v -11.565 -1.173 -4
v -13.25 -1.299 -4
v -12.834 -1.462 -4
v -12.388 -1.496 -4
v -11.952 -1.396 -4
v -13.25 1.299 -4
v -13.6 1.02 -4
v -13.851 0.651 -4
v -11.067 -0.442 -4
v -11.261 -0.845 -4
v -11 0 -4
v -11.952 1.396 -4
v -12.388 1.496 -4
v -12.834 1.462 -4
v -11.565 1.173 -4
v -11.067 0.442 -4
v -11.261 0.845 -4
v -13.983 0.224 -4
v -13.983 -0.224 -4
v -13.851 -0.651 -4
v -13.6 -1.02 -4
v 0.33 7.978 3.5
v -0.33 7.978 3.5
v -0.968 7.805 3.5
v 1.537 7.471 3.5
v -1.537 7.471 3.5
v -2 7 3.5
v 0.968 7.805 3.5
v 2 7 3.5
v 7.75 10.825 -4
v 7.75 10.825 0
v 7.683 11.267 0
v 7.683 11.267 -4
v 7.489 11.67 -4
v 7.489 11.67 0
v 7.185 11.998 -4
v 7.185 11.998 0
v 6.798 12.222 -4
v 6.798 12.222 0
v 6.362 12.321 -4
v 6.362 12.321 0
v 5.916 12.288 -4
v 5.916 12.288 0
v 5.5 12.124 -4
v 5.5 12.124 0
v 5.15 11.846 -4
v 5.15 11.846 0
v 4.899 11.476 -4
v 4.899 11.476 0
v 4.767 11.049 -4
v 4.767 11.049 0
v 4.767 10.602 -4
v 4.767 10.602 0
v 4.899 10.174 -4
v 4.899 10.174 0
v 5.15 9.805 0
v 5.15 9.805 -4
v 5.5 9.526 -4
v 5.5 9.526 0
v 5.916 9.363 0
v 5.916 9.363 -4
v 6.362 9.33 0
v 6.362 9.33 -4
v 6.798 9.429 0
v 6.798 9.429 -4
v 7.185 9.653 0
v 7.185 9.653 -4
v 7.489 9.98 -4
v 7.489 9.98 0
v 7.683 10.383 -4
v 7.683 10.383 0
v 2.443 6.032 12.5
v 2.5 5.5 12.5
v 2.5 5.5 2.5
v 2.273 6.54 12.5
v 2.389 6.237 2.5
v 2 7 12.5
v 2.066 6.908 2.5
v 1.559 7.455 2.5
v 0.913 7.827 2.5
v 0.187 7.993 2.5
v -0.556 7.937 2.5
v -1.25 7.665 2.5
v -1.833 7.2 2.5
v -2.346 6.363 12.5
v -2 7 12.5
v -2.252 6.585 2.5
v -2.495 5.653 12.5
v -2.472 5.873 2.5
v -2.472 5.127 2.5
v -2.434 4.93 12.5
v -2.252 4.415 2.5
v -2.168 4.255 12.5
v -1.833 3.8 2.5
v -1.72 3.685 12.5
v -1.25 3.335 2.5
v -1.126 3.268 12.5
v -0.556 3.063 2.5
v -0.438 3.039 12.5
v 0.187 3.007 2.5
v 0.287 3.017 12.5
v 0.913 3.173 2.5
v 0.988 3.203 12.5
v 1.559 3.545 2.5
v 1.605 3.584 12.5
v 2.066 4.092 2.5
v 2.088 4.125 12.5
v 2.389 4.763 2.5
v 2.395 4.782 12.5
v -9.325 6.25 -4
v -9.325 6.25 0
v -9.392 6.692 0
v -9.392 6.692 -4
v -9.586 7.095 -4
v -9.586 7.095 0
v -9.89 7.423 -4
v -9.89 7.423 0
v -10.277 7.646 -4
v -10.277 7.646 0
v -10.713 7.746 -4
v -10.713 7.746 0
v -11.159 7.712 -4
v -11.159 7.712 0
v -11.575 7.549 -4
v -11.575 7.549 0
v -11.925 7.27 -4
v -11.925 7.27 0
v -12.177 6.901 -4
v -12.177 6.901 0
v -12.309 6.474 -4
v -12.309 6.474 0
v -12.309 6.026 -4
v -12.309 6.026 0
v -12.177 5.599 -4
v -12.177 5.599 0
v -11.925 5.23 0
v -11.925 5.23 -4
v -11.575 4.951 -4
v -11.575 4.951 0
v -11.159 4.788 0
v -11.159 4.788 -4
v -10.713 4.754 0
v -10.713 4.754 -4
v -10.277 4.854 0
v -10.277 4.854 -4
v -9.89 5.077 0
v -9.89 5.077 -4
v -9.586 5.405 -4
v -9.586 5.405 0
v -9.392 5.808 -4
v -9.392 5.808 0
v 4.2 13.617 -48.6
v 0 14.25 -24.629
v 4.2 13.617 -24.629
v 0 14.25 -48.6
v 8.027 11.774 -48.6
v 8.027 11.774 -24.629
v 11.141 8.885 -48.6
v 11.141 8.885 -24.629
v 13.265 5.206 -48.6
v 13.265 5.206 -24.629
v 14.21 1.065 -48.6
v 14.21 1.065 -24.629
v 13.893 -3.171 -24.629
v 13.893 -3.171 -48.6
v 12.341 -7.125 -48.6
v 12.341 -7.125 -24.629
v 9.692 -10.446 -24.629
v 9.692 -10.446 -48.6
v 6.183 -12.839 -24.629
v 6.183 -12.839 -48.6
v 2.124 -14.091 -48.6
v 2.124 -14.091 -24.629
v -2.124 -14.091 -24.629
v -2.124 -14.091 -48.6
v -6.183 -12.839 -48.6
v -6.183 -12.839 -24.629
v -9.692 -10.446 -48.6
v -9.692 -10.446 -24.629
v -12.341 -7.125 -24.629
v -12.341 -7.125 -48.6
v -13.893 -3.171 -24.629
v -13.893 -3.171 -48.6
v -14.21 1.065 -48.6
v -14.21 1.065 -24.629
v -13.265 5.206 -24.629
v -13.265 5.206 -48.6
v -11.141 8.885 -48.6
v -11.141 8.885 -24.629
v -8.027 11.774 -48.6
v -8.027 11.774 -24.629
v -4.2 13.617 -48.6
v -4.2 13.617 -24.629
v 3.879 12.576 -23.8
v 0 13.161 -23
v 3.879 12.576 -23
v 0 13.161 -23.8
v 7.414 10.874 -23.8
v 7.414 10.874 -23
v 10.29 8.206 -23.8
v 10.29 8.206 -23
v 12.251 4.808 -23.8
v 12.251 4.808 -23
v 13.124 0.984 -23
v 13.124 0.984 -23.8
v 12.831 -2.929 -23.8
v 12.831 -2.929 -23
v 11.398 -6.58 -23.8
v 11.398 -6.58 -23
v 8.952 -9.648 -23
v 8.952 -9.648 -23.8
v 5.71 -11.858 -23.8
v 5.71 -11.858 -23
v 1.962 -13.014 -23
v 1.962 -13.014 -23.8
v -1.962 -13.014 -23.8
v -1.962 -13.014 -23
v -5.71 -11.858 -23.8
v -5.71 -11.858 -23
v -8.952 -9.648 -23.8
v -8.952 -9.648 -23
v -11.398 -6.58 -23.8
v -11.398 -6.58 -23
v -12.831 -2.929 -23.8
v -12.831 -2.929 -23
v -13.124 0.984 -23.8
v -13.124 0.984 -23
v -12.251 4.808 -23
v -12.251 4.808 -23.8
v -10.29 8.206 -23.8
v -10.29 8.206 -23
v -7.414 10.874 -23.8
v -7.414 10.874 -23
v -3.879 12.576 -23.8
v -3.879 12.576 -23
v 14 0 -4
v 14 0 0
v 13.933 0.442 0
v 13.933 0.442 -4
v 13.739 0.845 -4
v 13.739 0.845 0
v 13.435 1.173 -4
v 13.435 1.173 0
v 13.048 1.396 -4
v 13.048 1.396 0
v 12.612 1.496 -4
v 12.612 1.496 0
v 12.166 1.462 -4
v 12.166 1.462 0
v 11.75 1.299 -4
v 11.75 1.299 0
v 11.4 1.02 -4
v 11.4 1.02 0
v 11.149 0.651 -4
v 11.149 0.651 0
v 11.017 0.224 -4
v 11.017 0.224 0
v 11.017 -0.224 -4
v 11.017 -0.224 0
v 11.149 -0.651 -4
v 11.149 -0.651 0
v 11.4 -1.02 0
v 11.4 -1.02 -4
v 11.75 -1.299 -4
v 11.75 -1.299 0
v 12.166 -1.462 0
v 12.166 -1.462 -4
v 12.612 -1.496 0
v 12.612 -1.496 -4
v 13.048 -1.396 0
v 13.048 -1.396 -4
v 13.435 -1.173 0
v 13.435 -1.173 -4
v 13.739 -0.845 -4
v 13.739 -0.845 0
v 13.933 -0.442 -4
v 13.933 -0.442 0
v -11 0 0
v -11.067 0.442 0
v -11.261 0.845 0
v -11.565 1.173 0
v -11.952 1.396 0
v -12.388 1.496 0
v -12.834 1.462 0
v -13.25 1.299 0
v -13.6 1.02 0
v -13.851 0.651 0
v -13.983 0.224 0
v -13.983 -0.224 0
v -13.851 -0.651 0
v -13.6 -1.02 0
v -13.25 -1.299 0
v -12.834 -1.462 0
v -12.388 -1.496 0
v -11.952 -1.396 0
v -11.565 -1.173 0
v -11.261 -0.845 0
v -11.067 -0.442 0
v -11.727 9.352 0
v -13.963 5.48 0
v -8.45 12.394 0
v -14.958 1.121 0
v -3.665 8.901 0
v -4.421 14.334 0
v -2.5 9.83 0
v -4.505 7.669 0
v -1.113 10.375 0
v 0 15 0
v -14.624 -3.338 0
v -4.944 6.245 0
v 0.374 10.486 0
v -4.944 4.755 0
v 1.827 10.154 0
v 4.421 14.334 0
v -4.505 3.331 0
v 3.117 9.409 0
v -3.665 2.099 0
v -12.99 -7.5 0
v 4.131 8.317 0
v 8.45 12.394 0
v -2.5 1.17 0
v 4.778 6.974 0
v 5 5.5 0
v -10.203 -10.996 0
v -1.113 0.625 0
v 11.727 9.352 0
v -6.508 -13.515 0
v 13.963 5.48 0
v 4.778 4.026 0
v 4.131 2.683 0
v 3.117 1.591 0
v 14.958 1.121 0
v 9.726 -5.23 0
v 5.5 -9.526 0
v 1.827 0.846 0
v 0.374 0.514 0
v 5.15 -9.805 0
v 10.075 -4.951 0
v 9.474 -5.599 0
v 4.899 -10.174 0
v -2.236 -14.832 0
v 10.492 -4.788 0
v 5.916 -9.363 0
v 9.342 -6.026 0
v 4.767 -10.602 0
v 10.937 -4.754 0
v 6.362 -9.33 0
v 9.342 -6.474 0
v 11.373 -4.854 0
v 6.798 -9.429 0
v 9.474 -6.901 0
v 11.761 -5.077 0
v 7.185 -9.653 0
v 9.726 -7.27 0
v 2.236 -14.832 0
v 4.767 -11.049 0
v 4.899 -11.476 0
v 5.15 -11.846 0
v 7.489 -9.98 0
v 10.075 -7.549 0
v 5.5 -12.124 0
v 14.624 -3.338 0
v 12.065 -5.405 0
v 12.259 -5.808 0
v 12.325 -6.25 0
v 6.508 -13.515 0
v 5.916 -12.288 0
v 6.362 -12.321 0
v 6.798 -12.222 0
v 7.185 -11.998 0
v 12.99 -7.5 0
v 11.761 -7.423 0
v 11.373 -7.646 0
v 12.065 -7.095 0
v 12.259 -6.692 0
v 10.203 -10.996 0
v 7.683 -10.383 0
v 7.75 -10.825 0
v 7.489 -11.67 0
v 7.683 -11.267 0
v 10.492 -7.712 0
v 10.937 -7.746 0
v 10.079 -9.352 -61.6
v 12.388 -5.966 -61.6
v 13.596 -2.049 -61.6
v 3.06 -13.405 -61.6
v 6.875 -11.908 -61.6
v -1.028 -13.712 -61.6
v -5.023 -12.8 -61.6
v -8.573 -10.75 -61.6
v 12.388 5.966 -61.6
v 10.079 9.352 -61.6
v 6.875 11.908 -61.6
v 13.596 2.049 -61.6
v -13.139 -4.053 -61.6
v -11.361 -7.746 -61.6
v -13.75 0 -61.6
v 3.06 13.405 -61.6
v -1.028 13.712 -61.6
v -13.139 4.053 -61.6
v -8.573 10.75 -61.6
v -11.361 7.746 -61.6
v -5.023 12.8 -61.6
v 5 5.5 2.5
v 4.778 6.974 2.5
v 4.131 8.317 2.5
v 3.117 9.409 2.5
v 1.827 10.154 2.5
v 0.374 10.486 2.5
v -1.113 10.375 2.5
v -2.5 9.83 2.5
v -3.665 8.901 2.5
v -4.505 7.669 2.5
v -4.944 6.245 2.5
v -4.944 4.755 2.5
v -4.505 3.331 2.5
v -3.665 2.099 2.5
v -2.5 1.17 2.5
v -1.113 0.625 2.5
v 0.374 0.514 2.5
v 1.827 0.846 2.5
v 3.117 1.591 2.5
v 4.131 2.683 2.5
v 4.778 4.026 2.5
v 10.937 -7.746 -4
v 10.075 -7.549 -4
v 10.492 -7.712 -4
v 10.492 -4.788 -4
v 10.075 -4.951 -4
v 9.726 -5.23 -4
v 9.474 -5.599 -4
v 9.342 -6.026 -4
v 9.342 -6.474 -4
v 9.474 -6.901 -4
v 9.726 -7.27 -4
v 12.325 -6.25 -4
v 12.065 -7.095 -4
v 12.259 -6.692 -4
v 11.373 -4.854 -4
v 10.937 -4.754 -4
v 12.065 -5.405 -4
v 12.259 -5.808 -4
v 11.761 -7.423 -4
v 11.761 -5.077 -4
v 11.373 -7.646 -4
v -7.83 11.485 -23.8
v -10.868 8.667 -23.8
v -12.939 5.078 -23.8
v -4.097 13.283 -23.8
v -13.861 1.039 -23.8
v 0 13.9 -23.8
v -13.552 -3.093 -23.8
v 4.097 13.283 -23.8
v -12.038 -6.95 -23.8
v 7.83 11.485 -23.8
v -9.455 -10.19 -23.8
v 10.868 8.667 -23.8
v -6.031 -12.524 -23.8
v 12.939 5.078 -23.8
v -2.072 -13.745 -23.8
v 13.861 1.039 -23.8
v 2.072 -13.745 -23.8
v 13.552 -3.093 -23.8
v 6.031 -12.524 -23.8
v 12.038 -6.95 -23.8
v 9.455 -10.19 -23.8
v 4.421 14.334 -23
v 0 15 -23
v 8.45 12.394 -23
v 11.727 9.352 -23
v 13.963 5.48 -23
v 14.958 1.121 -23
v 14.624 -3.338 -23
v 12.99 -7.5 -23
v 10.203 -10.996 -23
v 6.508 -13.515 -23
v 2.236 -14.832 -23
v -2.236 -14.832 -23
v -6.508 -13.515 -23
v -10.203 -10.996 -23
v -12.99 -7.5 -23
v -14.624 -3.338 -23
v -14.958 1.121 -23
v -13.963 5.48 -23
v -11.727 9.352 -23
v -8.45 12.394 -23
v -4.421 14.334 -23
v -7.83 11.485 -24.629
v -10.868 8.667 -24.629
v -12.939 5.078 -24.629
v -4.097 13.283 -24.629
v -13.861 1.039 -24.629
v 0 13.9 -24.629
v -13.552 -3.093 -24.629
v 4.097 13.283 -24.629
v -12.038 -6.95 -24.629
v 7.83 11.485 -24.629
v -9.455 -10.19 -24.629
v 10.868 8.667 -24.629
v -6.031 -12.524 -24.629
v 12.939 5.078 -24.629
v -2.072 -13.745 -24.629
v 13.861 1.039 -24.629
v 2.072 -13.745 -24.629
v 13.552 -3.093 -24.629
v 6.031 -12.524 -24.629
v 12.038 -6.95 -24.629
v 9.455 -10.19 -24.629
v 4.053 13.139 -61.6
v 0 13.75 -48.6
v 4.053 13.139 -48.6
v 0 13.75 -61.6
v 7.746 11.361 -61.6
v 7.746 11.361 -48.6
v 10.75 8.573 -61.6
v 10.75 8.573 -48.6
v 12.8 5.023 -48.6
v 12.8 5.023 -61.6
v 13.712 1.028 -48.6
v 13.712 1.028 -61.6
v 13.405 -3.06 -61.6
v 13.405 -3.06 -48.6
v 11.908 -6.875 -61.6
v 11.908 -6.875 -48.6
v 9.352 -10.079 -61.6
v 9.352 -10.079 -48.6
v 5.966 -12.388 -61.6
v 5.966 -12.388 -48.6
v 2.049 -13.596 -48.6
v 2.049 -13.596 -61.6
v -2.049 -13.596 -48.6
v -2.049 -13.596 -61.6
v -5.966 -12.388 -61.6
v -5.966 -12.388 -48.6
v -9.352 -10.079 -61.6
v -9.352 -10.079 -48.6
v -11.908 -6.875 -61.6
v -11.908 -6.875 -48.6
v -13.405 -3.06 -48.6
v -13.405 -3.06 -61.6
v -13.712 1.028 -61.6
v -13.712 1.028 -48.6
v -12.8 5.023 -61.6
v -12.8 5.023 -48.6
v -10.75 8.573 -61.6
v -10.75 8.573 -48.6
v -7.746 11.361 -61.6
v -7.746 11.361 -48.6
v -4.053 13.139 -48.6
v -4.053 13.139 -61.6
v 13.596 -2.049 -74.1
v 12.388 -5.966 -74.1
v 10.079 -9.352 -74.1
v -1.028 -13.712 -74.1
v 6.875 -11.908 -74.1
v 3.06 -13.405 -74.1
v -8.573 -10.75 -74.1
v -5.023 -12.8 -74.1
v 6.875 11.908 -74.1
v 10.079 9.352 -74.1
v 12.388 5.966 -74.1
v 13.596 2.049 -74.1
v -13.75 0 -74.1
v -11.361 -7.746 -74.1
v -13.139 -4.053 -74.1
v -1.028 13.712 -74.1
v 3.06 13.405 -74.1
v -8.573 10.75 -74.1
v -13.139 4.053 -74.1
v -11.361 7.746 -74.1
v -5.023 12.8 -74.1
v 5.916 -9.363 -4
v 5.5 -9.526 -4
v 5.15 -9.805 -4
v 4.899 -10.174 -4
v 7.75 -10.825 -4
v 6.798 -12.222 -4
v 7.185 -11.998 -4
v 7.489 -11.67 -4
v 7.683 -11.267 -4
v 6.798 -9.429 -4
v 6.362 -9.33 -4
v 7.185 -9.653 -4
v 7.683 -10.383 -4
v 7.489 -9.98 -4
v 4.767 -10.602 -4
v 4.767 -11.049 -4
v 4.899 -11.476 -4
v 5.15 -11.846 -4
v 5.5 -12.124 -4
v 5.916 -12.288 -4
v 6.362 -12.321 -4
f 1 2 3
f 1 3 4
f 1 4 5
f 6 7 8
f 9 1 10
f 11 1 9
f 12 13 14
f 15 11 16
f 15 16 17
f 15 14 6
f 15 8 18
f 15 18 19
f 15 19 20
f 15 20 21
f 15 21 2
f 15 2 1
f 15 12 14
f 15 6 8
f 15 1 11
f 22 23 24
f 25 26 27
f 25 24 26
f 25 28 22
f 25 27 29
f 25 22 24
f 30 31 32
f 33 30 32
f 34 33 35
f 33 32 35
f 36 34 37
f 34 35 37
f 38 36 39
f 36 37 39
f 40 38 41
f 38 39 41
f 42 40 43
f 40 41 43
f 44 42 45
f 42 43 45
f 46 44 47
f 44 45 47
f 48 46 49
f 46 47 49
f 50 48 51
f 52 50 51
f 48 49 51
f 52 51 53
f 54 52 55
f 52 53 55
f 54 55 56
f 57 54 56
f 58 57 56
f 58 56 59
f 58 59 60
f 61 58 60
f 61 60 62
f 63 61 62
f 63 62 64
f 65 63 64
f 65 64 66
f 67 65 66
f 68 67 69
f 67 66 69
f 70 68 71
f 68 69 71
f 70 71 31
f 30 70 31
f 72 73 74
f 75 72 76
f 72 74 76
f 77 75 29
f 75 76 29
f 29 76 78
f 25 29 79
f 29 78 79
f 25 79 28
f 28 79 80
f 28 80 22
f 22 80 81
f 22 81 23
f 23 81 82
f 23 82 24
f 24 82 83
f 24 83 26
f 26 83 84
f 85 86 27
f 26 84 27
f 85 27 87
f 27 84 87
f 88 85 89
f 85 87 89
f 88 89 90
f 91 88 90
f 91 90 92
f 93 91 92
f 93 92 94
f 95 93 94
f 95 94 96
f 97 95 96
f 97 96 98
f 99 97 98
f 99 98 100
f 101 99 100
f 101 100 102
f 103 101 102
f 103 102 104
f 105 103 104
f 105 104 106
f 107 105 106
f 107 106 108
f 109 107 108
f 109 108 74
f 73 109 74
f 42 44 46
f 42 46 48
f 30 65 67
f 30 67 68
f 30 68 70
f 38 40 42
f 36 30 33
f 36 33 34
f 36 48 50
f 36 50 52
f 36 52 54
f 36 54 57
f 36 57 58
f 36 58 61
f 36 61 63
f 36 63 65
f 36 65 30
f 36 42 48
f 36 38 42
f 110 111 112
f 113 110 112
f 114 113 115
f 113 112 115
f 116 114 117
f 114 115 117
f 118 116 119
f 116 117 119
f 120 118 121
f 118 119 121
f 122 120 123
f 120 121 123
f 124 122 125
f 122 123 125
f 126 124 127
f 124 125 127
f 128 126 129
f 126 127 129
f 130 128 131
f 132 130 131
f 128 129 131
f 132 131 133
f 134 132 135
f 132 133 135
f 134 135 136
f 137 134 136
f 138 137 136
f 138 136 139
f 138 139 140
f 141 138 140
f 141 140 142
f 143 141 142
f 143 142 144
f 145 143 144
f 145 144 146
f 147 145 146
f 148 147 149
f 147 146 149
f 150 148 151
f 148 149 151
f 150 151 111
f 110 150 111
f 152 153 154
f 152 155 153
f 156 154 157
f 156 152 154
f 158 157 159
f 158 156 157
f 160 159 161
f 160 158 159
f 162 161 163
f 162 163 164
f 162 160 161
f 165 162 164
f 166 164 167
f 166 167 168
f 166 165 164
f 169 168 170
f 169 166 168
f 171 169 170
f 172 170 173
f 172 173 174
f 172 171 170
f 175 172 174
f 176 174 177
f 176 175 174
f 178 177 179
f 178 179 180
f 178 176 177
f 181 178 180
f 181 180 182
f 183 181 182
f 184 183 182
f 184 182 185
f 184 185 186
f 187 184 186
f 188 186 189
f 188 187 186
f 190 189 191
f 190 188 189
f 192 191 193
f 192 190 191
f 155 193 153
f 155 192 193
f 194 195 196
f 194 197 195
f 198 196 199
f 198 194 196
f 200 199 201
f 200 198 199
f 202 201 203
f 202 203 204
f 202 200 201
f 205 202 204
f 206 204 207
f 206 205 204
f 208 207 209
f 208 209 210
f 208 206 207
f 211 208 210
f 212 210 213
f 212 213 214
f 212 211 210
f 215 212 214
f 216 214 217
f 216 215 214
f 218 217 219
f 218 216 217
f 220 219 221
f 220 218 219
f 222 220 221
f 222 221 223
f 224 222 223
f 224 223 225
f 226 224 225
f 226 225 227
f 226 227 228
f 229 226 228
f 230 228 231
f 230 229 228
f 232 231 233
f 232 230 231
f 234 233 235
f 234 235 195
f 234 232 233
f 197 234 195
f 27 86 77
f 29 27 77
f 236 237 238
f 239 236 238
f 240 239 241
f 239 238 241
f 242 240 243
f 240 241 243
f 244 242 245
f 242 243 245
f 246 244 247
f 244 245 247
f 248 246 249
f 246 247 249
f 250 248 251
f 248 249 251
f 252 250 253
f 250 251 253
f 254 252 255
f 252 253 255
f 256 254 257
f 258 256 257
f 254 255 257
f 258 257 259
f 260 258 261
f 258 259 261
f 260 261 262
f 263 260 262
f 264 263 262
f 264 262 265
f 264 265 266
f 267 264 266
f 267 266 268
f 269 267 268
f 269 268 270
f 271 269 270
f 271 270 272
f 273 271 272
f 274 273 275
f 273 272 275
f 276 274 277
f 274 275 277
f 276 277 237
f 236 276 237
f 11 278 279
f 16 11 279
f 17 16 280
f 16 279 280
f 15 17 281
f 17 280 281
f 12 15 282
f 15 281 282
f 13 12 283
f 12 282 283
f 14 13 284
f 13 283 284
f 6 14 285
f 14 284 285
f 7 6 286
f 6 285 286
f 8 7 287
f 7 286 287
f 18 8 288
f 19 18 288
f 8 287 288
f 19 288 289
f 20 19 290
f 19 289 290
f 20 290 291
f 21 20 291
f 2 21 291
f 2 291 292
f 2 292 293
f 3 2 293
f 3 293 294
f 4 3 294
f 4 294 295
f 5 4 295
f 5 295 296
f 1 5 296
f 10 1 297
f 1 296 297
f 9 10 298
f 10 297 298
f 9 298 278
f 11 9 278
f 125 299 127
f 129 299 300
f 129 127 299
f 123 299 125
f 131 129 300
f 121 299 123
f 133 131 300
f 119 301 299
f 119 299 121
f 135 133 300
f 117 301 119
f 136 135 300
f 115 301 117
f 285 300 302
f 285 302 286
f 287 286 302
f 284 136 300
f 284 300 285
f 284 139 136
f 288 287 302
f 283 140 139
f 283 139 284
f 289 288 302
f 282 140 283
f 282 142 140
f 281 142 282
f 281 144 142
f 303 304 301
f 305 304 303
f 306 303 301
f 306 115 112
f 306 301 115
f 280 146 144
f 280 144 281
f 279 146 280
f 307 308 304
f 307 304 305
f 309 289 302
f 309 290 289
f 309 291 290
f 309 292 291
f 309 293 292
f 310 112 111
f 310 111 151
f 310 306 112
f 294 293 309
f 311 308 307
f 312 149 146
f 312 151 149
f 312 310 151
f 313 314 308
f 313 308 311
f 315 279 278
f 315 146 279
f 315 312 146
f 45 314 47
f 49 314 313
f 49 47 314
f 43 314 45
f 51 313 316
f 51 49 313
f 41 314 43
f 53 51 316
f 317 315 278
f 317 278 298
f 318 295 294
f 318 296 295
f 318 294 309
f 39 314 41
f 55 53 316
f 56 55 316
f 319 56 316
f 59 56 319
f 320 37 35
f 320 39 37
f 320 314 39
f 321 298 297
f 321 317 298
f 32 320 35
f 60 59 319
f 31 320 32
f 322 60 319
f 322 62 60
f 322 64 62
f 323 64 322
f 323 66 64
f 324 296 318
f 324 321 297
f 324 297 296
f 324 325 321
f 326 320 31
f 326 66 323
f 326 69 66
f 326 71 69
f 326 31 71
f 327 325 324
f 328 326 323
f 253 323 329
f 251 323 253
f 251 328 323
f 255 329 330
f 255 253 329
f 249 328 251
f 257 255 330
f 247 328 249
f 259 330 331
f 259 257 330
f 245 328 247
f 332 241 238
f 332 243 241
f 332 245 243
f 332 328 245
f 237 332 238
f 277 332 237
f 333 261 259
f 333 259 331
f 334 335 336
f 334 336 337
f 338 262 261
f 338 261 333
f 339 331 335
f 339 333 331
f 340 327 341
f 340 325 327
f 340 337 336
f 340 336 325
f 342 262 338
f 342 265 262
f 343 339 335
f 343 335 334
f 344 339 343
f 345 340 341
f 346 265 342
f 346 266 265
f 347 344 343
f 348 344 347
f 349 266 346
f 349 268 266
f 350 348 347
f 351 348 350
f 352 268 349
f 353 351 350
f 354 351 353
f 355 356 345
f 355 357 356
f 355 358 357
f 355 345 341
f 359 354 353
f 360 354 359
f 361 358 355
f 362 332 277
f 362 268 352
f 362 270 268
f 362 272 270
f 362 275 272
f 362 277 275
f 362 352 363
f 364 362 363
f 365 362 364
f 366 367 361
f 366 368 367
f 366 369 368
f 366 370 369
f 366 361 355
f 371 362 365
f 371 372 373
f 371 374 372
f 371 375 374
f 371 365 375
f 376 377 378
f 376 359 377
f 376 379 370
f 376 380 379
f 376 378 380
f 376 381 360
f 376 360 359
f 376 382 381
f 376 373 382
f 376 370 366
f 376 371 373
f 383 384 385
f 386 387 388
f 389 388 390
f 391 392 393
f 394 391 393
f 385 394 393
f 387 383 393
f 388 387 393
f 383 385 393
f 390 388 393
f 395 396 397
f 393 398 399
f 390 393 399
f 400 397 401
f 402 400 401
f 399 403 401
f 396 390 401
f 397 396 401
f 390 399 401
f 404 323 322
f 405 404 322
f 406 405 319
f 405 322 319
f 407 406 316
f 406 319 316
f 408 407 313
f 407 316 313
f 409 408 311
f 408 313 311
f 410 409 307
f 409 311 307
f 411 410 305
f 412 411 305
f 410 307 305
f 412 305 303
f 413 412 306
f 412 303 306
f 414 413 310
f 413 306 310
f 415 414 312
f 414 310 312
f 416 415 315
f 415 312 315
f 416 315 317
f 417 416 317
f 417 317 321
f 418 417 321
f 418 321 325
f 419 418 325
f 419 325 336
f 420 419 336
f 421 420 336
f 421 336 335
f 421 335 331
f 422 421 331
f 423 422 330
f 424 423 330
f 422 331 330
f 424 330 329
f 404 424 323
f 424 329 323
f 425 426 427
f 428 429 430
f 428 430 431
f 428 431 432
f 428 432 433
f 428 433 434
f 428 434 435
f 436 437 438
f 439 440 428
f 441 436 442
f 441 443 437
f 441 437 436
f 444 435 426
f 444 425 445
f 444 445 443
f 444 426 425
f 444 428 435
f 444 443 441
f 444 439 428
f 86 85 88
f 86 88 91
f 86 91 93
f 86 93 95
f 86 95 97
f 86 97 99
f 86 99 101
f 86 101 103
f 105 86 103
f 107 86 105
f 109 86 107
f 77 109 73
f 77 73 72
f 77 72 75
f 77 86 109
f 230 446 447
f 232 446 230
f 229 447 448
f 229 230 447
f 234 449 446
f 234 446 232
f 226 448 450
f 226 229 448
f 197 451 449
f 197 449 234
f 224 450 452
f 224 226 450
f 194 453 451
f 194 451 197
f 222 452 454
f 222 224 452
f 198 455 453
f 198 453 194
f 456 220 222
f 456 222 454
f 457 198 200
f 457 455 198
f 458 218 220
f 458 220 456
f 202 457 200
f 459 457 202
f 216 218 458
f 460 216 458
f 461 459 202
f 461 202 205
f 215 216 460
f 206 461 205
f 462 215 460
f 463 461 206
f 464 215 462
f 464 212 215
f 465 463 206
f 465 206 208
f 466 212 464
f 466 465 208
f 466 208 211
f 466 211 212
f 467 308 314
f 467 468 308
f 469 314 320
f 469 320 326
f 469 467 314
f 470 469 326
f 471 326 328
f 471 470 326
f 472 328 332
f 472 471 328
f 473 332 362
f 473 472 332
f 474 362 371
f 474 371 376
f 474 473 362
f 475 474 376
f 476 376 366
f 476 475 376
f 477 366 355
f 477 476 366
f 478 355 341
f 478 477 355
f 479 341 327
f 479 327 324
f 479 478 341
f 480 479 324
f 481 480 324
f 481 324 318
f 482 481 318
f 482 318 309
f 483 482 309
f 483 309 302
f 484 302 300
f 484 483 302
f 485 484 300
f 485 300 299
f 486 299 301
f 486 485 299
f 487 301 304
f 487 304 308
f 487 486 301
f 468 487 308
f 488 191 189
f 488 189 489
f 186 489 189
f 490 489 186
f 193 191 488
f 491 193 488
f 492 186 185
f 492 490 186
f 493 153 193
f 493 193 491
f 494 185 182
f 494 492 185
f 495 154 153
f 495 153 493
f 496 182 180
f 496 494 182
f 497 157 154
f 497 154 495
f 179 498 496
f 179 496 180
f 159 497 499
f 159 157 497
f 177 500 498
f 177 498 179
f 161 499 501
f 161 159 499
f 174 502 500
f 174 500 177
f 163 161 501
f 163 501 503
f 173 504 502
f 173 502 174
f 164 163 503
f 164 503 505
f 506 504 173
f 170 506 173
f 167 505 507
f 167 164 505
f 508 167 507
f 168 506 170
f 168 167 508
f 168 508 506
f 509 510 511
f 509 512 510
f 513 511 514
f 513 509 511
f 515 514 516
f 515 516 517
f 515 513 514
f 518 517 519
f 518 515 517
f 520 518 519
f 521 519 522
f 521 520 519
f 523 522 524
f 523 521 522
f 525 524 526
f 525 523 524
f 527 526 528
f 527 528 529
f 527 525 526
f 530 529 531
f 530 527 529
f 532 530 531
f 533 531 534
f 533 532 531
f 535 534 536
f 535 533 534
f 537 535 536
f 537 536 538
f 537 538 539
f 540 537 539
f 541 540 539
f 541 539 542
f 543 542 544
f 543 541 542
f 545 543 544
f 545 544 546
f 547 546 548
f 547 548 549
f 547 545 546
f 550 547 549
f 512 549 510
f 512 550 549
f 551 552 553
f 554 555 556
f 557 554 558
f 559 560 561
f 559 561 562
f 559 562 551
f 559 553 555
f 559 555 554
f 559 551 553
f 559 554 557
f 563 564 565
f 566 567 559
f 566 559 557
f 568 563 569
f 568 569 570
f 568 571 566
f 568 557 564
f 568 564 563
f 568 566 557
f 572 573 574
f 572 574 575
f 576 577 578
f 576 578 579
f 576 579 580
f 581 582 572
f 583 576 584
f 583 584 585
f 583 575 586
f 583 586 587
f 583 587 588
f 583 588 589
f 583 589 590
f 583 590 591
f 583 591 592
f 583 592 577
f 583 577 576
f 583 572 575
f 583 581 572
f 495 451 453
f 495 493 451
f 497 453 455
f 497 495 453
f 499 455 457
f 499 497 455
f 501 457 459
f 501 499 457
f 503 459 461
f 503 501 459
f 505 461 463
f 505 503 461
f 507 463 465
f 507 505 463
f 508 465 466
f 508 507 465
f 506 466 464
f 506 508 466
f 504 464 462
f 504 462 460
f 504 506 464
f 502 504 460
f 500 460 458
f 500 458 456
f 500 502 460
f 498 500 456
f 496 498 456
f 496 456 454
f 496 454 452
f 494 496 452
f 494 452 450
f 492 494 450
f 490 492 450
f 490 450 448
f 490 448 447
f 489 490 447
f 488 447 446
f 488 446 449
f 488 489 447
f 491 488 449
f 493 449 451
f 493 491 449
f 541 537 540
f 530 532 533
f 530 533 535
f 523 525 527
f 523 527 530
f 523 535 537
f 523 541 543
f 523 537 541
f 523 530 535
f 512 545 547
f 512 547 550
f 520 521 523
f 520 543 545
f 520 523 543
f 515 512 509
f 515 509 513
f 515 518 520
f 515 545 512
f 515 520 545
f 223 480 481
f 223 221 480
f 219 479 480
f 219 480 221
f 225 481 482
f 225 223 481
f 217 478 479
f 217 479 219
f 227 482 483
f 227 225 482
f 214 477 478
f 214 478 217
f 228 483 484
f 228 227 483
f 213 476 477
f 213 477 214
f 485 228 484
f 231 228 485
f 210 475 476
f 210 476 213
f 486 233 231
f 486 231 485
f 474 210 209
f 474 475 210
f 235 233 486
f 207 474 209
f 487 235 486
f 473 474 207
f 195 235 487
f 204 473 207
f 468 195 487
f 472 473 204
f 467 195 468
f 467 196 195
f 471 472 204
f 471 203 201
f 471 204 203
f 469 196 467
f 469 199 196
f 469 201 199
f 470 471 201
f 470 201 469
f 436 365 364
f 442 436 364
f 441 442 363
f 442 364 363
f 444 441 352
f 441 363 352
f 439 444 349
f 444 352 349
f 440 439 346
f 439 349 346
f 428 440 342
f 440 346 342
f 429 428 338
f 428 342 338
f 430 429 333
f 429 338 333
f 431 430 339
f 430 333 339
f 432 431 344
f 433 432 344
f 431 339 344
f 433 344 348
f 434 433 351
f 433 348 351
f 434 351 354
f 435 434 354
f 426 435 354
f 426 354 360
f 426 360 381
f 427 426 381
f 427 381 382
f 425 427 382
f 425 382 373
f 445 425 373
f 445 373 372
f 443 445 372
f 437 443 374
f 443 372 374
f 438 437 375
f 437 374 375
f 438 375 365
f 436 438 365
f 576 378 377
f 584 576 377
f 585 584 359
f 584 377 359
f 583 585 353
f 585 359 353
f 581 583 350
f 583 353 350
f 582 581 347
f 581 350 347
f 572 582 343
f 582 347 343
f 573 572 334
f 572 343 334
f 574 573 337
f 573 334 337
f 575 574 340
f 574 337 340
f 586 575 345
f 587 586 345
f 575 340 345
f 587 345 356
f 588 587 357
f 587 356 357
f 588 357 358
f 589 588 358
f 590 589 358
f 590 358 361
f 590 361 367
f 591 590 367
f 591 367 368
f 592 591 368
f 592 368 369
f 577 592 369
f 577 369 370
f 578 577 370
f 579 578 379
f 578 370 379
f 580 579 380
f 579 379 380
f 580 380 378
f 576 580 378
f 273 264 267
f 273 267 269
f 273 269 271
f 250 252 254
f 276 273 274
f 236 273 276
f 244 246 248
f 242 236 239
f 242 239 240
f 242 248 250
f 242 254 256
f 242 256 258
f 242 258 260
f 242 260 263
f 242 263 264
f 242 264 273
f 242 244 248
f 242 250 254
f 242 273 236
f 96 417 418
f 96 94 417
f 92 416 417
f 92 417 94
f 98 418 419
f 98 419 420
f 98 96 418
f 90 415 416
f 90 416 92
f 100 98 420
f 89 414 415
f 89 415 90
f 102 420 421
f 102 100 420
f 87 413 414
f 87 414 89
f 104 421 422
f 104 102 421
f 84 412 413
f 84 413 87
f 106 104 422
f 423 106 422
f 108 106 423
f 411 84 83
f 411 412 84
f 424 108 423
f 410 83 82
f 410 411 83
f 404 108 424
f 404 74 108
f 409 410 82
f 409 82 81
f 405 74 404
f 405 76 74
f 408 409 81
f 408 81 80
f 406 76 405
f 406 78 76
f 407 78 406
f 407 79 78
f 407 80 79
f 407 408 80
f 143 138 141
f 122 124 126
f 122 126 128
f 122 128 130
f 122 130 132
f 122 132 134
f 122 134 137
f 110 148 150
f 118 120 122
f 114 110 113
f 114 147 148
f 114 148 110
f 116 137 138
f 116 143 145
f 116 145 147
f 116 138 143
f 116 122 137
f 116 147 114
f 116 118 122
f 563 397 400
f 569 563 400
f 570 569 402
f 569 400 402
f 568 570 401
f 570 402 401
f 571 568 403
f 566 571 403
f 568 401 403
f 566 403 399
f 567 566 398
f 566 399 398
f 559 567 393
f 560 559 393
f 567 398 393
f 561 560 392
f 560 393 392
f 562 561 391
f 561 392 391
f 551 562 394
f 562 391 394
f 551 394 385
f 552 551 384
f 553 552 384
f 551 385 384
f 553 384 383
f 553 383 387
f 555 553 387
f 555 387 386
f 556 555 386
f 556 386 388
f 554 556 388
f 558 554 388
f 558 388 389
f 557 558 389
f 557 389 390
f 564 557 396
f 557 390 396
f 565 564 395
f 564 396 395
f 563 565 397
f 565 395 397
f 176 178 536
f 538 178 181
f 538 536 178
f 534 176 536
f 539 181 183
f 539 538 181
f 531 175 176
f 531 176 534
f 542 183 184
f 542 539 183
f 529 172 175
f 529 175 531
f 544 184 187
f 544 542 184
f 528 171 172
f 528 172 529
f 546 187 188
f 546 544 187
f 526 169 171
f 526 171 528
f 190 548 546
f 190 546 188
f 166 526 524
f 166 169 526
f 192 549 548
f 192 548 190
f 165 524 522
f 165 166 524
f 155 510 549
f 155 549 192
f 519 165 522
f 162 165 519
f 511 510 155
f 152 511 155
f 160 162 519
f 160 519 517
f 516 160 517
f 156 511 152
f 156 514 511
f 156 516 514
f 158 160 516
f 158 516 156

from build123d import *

# Parameters (mm, degrees)
SKETCH_3_R          = 13.75
EXTRUDE_1_DEPTH     = 12.5
SKETCH_4_R          = 1.5
CUT_EXTRUDE_1_DEPTH = 4
SKETCH_5_R          = 5
EXTRUDE_2_DEPTH     = 2.5
SKETCH_6_R          = 2.5
EXTRUDE_3_DEPTH     = 10
CUT_EXTRUDE_2_DEPTH = 9


with BuildPart() as part:
    # Эскиз2 → Повернуть1 (revolve)
    with BuildSketch(Plane(origin=(0, 0, 0), x_dir=(0, 0, -1), z_dir=(1, 0, 0))):
        Polygon((0, 0), (0, 15), (23, 15), (23, 13.160869224), (23.8, 13.160869224), (23.8, 13.900188548), (24.629157433, 13.900188548), (24.629157433, 14.25), (48.6, 14.25), (48.6, 13.75), (61.6, 13.75), (61.6, 0), align=None)
    revolve(axis=Axis((0, 0, 0), (0, 0, -1)))

    # Эскиз4 → Вырез-Вытянуть1 (cut)
    with BuildSketch(Plane.XY):
        with Locations((-12.5, 0)):
            Circle(SKETCH_4_R)
        with Locations((-10.825317547, 6.25)):
            Circle(SKETCH_4_R)
        with Locations((6.25, 10.825317547)):
            Circle(SKETCH_4_R)
        with Locations((12.5, 0)):
            Circle(SKETCH_4_R)
        with Locations((10.825317547, -6.25)):
            Circle(SKETCH_4_R)
        with Locations((6.25, -10.825317547)):
            Circle(SKETCH_4_R)
    extrude(amount=-CUT_EXTRUDE_1_DEPTH, mode=Mode.SUBTRACT)

    # Эскиз5 → Бобышка-Вытянуть2 (add)
    with BuildSketch(Plane.XY):
        with Locations((0, 5.5)):
            Circle(SKETCH_5_R)
    extrude(amount=EXTRUDE_2_DEPTH)

    # Эскиз6 → Бобышка-Вытянуть3 (add)
    with BuildSketch(Plane.XY.offset(2.5)):
        with Locations((0, 5.5)):
            Circle(SKETCH_6_R)
    extrude(amount=EXTRUDE_3_DEPTH)

    # Эскиз7 → Вырез-Вытянуть2 (cut)
    with BuildSketch(Plane.XY.offset(12.5)):
        Polygon((-2.640466968, 7), (2.828249594, 7), (2.828249594, 8.822905521), (-1.513579919, 8.822905521), align=None)
    extrude(amount=-CUT_EXTRUDE_2_DEPTH, mode=Mode.SUBTRACT)


with BuildPart() as body_2:
    # Эскиз3 → Бобышка-Вытянуть1 (new body)
    with BuildSketch(Plane(origin=(0, 0, -61.6), x_dir=(-1, 0, 0), z_dir=(0, 0, -1))):
        Circle(SKETCH_3_R)
    extrude(amount=EXTRUDE_1_DEPTH)


solid = Compound([part.part, body_2.part])
